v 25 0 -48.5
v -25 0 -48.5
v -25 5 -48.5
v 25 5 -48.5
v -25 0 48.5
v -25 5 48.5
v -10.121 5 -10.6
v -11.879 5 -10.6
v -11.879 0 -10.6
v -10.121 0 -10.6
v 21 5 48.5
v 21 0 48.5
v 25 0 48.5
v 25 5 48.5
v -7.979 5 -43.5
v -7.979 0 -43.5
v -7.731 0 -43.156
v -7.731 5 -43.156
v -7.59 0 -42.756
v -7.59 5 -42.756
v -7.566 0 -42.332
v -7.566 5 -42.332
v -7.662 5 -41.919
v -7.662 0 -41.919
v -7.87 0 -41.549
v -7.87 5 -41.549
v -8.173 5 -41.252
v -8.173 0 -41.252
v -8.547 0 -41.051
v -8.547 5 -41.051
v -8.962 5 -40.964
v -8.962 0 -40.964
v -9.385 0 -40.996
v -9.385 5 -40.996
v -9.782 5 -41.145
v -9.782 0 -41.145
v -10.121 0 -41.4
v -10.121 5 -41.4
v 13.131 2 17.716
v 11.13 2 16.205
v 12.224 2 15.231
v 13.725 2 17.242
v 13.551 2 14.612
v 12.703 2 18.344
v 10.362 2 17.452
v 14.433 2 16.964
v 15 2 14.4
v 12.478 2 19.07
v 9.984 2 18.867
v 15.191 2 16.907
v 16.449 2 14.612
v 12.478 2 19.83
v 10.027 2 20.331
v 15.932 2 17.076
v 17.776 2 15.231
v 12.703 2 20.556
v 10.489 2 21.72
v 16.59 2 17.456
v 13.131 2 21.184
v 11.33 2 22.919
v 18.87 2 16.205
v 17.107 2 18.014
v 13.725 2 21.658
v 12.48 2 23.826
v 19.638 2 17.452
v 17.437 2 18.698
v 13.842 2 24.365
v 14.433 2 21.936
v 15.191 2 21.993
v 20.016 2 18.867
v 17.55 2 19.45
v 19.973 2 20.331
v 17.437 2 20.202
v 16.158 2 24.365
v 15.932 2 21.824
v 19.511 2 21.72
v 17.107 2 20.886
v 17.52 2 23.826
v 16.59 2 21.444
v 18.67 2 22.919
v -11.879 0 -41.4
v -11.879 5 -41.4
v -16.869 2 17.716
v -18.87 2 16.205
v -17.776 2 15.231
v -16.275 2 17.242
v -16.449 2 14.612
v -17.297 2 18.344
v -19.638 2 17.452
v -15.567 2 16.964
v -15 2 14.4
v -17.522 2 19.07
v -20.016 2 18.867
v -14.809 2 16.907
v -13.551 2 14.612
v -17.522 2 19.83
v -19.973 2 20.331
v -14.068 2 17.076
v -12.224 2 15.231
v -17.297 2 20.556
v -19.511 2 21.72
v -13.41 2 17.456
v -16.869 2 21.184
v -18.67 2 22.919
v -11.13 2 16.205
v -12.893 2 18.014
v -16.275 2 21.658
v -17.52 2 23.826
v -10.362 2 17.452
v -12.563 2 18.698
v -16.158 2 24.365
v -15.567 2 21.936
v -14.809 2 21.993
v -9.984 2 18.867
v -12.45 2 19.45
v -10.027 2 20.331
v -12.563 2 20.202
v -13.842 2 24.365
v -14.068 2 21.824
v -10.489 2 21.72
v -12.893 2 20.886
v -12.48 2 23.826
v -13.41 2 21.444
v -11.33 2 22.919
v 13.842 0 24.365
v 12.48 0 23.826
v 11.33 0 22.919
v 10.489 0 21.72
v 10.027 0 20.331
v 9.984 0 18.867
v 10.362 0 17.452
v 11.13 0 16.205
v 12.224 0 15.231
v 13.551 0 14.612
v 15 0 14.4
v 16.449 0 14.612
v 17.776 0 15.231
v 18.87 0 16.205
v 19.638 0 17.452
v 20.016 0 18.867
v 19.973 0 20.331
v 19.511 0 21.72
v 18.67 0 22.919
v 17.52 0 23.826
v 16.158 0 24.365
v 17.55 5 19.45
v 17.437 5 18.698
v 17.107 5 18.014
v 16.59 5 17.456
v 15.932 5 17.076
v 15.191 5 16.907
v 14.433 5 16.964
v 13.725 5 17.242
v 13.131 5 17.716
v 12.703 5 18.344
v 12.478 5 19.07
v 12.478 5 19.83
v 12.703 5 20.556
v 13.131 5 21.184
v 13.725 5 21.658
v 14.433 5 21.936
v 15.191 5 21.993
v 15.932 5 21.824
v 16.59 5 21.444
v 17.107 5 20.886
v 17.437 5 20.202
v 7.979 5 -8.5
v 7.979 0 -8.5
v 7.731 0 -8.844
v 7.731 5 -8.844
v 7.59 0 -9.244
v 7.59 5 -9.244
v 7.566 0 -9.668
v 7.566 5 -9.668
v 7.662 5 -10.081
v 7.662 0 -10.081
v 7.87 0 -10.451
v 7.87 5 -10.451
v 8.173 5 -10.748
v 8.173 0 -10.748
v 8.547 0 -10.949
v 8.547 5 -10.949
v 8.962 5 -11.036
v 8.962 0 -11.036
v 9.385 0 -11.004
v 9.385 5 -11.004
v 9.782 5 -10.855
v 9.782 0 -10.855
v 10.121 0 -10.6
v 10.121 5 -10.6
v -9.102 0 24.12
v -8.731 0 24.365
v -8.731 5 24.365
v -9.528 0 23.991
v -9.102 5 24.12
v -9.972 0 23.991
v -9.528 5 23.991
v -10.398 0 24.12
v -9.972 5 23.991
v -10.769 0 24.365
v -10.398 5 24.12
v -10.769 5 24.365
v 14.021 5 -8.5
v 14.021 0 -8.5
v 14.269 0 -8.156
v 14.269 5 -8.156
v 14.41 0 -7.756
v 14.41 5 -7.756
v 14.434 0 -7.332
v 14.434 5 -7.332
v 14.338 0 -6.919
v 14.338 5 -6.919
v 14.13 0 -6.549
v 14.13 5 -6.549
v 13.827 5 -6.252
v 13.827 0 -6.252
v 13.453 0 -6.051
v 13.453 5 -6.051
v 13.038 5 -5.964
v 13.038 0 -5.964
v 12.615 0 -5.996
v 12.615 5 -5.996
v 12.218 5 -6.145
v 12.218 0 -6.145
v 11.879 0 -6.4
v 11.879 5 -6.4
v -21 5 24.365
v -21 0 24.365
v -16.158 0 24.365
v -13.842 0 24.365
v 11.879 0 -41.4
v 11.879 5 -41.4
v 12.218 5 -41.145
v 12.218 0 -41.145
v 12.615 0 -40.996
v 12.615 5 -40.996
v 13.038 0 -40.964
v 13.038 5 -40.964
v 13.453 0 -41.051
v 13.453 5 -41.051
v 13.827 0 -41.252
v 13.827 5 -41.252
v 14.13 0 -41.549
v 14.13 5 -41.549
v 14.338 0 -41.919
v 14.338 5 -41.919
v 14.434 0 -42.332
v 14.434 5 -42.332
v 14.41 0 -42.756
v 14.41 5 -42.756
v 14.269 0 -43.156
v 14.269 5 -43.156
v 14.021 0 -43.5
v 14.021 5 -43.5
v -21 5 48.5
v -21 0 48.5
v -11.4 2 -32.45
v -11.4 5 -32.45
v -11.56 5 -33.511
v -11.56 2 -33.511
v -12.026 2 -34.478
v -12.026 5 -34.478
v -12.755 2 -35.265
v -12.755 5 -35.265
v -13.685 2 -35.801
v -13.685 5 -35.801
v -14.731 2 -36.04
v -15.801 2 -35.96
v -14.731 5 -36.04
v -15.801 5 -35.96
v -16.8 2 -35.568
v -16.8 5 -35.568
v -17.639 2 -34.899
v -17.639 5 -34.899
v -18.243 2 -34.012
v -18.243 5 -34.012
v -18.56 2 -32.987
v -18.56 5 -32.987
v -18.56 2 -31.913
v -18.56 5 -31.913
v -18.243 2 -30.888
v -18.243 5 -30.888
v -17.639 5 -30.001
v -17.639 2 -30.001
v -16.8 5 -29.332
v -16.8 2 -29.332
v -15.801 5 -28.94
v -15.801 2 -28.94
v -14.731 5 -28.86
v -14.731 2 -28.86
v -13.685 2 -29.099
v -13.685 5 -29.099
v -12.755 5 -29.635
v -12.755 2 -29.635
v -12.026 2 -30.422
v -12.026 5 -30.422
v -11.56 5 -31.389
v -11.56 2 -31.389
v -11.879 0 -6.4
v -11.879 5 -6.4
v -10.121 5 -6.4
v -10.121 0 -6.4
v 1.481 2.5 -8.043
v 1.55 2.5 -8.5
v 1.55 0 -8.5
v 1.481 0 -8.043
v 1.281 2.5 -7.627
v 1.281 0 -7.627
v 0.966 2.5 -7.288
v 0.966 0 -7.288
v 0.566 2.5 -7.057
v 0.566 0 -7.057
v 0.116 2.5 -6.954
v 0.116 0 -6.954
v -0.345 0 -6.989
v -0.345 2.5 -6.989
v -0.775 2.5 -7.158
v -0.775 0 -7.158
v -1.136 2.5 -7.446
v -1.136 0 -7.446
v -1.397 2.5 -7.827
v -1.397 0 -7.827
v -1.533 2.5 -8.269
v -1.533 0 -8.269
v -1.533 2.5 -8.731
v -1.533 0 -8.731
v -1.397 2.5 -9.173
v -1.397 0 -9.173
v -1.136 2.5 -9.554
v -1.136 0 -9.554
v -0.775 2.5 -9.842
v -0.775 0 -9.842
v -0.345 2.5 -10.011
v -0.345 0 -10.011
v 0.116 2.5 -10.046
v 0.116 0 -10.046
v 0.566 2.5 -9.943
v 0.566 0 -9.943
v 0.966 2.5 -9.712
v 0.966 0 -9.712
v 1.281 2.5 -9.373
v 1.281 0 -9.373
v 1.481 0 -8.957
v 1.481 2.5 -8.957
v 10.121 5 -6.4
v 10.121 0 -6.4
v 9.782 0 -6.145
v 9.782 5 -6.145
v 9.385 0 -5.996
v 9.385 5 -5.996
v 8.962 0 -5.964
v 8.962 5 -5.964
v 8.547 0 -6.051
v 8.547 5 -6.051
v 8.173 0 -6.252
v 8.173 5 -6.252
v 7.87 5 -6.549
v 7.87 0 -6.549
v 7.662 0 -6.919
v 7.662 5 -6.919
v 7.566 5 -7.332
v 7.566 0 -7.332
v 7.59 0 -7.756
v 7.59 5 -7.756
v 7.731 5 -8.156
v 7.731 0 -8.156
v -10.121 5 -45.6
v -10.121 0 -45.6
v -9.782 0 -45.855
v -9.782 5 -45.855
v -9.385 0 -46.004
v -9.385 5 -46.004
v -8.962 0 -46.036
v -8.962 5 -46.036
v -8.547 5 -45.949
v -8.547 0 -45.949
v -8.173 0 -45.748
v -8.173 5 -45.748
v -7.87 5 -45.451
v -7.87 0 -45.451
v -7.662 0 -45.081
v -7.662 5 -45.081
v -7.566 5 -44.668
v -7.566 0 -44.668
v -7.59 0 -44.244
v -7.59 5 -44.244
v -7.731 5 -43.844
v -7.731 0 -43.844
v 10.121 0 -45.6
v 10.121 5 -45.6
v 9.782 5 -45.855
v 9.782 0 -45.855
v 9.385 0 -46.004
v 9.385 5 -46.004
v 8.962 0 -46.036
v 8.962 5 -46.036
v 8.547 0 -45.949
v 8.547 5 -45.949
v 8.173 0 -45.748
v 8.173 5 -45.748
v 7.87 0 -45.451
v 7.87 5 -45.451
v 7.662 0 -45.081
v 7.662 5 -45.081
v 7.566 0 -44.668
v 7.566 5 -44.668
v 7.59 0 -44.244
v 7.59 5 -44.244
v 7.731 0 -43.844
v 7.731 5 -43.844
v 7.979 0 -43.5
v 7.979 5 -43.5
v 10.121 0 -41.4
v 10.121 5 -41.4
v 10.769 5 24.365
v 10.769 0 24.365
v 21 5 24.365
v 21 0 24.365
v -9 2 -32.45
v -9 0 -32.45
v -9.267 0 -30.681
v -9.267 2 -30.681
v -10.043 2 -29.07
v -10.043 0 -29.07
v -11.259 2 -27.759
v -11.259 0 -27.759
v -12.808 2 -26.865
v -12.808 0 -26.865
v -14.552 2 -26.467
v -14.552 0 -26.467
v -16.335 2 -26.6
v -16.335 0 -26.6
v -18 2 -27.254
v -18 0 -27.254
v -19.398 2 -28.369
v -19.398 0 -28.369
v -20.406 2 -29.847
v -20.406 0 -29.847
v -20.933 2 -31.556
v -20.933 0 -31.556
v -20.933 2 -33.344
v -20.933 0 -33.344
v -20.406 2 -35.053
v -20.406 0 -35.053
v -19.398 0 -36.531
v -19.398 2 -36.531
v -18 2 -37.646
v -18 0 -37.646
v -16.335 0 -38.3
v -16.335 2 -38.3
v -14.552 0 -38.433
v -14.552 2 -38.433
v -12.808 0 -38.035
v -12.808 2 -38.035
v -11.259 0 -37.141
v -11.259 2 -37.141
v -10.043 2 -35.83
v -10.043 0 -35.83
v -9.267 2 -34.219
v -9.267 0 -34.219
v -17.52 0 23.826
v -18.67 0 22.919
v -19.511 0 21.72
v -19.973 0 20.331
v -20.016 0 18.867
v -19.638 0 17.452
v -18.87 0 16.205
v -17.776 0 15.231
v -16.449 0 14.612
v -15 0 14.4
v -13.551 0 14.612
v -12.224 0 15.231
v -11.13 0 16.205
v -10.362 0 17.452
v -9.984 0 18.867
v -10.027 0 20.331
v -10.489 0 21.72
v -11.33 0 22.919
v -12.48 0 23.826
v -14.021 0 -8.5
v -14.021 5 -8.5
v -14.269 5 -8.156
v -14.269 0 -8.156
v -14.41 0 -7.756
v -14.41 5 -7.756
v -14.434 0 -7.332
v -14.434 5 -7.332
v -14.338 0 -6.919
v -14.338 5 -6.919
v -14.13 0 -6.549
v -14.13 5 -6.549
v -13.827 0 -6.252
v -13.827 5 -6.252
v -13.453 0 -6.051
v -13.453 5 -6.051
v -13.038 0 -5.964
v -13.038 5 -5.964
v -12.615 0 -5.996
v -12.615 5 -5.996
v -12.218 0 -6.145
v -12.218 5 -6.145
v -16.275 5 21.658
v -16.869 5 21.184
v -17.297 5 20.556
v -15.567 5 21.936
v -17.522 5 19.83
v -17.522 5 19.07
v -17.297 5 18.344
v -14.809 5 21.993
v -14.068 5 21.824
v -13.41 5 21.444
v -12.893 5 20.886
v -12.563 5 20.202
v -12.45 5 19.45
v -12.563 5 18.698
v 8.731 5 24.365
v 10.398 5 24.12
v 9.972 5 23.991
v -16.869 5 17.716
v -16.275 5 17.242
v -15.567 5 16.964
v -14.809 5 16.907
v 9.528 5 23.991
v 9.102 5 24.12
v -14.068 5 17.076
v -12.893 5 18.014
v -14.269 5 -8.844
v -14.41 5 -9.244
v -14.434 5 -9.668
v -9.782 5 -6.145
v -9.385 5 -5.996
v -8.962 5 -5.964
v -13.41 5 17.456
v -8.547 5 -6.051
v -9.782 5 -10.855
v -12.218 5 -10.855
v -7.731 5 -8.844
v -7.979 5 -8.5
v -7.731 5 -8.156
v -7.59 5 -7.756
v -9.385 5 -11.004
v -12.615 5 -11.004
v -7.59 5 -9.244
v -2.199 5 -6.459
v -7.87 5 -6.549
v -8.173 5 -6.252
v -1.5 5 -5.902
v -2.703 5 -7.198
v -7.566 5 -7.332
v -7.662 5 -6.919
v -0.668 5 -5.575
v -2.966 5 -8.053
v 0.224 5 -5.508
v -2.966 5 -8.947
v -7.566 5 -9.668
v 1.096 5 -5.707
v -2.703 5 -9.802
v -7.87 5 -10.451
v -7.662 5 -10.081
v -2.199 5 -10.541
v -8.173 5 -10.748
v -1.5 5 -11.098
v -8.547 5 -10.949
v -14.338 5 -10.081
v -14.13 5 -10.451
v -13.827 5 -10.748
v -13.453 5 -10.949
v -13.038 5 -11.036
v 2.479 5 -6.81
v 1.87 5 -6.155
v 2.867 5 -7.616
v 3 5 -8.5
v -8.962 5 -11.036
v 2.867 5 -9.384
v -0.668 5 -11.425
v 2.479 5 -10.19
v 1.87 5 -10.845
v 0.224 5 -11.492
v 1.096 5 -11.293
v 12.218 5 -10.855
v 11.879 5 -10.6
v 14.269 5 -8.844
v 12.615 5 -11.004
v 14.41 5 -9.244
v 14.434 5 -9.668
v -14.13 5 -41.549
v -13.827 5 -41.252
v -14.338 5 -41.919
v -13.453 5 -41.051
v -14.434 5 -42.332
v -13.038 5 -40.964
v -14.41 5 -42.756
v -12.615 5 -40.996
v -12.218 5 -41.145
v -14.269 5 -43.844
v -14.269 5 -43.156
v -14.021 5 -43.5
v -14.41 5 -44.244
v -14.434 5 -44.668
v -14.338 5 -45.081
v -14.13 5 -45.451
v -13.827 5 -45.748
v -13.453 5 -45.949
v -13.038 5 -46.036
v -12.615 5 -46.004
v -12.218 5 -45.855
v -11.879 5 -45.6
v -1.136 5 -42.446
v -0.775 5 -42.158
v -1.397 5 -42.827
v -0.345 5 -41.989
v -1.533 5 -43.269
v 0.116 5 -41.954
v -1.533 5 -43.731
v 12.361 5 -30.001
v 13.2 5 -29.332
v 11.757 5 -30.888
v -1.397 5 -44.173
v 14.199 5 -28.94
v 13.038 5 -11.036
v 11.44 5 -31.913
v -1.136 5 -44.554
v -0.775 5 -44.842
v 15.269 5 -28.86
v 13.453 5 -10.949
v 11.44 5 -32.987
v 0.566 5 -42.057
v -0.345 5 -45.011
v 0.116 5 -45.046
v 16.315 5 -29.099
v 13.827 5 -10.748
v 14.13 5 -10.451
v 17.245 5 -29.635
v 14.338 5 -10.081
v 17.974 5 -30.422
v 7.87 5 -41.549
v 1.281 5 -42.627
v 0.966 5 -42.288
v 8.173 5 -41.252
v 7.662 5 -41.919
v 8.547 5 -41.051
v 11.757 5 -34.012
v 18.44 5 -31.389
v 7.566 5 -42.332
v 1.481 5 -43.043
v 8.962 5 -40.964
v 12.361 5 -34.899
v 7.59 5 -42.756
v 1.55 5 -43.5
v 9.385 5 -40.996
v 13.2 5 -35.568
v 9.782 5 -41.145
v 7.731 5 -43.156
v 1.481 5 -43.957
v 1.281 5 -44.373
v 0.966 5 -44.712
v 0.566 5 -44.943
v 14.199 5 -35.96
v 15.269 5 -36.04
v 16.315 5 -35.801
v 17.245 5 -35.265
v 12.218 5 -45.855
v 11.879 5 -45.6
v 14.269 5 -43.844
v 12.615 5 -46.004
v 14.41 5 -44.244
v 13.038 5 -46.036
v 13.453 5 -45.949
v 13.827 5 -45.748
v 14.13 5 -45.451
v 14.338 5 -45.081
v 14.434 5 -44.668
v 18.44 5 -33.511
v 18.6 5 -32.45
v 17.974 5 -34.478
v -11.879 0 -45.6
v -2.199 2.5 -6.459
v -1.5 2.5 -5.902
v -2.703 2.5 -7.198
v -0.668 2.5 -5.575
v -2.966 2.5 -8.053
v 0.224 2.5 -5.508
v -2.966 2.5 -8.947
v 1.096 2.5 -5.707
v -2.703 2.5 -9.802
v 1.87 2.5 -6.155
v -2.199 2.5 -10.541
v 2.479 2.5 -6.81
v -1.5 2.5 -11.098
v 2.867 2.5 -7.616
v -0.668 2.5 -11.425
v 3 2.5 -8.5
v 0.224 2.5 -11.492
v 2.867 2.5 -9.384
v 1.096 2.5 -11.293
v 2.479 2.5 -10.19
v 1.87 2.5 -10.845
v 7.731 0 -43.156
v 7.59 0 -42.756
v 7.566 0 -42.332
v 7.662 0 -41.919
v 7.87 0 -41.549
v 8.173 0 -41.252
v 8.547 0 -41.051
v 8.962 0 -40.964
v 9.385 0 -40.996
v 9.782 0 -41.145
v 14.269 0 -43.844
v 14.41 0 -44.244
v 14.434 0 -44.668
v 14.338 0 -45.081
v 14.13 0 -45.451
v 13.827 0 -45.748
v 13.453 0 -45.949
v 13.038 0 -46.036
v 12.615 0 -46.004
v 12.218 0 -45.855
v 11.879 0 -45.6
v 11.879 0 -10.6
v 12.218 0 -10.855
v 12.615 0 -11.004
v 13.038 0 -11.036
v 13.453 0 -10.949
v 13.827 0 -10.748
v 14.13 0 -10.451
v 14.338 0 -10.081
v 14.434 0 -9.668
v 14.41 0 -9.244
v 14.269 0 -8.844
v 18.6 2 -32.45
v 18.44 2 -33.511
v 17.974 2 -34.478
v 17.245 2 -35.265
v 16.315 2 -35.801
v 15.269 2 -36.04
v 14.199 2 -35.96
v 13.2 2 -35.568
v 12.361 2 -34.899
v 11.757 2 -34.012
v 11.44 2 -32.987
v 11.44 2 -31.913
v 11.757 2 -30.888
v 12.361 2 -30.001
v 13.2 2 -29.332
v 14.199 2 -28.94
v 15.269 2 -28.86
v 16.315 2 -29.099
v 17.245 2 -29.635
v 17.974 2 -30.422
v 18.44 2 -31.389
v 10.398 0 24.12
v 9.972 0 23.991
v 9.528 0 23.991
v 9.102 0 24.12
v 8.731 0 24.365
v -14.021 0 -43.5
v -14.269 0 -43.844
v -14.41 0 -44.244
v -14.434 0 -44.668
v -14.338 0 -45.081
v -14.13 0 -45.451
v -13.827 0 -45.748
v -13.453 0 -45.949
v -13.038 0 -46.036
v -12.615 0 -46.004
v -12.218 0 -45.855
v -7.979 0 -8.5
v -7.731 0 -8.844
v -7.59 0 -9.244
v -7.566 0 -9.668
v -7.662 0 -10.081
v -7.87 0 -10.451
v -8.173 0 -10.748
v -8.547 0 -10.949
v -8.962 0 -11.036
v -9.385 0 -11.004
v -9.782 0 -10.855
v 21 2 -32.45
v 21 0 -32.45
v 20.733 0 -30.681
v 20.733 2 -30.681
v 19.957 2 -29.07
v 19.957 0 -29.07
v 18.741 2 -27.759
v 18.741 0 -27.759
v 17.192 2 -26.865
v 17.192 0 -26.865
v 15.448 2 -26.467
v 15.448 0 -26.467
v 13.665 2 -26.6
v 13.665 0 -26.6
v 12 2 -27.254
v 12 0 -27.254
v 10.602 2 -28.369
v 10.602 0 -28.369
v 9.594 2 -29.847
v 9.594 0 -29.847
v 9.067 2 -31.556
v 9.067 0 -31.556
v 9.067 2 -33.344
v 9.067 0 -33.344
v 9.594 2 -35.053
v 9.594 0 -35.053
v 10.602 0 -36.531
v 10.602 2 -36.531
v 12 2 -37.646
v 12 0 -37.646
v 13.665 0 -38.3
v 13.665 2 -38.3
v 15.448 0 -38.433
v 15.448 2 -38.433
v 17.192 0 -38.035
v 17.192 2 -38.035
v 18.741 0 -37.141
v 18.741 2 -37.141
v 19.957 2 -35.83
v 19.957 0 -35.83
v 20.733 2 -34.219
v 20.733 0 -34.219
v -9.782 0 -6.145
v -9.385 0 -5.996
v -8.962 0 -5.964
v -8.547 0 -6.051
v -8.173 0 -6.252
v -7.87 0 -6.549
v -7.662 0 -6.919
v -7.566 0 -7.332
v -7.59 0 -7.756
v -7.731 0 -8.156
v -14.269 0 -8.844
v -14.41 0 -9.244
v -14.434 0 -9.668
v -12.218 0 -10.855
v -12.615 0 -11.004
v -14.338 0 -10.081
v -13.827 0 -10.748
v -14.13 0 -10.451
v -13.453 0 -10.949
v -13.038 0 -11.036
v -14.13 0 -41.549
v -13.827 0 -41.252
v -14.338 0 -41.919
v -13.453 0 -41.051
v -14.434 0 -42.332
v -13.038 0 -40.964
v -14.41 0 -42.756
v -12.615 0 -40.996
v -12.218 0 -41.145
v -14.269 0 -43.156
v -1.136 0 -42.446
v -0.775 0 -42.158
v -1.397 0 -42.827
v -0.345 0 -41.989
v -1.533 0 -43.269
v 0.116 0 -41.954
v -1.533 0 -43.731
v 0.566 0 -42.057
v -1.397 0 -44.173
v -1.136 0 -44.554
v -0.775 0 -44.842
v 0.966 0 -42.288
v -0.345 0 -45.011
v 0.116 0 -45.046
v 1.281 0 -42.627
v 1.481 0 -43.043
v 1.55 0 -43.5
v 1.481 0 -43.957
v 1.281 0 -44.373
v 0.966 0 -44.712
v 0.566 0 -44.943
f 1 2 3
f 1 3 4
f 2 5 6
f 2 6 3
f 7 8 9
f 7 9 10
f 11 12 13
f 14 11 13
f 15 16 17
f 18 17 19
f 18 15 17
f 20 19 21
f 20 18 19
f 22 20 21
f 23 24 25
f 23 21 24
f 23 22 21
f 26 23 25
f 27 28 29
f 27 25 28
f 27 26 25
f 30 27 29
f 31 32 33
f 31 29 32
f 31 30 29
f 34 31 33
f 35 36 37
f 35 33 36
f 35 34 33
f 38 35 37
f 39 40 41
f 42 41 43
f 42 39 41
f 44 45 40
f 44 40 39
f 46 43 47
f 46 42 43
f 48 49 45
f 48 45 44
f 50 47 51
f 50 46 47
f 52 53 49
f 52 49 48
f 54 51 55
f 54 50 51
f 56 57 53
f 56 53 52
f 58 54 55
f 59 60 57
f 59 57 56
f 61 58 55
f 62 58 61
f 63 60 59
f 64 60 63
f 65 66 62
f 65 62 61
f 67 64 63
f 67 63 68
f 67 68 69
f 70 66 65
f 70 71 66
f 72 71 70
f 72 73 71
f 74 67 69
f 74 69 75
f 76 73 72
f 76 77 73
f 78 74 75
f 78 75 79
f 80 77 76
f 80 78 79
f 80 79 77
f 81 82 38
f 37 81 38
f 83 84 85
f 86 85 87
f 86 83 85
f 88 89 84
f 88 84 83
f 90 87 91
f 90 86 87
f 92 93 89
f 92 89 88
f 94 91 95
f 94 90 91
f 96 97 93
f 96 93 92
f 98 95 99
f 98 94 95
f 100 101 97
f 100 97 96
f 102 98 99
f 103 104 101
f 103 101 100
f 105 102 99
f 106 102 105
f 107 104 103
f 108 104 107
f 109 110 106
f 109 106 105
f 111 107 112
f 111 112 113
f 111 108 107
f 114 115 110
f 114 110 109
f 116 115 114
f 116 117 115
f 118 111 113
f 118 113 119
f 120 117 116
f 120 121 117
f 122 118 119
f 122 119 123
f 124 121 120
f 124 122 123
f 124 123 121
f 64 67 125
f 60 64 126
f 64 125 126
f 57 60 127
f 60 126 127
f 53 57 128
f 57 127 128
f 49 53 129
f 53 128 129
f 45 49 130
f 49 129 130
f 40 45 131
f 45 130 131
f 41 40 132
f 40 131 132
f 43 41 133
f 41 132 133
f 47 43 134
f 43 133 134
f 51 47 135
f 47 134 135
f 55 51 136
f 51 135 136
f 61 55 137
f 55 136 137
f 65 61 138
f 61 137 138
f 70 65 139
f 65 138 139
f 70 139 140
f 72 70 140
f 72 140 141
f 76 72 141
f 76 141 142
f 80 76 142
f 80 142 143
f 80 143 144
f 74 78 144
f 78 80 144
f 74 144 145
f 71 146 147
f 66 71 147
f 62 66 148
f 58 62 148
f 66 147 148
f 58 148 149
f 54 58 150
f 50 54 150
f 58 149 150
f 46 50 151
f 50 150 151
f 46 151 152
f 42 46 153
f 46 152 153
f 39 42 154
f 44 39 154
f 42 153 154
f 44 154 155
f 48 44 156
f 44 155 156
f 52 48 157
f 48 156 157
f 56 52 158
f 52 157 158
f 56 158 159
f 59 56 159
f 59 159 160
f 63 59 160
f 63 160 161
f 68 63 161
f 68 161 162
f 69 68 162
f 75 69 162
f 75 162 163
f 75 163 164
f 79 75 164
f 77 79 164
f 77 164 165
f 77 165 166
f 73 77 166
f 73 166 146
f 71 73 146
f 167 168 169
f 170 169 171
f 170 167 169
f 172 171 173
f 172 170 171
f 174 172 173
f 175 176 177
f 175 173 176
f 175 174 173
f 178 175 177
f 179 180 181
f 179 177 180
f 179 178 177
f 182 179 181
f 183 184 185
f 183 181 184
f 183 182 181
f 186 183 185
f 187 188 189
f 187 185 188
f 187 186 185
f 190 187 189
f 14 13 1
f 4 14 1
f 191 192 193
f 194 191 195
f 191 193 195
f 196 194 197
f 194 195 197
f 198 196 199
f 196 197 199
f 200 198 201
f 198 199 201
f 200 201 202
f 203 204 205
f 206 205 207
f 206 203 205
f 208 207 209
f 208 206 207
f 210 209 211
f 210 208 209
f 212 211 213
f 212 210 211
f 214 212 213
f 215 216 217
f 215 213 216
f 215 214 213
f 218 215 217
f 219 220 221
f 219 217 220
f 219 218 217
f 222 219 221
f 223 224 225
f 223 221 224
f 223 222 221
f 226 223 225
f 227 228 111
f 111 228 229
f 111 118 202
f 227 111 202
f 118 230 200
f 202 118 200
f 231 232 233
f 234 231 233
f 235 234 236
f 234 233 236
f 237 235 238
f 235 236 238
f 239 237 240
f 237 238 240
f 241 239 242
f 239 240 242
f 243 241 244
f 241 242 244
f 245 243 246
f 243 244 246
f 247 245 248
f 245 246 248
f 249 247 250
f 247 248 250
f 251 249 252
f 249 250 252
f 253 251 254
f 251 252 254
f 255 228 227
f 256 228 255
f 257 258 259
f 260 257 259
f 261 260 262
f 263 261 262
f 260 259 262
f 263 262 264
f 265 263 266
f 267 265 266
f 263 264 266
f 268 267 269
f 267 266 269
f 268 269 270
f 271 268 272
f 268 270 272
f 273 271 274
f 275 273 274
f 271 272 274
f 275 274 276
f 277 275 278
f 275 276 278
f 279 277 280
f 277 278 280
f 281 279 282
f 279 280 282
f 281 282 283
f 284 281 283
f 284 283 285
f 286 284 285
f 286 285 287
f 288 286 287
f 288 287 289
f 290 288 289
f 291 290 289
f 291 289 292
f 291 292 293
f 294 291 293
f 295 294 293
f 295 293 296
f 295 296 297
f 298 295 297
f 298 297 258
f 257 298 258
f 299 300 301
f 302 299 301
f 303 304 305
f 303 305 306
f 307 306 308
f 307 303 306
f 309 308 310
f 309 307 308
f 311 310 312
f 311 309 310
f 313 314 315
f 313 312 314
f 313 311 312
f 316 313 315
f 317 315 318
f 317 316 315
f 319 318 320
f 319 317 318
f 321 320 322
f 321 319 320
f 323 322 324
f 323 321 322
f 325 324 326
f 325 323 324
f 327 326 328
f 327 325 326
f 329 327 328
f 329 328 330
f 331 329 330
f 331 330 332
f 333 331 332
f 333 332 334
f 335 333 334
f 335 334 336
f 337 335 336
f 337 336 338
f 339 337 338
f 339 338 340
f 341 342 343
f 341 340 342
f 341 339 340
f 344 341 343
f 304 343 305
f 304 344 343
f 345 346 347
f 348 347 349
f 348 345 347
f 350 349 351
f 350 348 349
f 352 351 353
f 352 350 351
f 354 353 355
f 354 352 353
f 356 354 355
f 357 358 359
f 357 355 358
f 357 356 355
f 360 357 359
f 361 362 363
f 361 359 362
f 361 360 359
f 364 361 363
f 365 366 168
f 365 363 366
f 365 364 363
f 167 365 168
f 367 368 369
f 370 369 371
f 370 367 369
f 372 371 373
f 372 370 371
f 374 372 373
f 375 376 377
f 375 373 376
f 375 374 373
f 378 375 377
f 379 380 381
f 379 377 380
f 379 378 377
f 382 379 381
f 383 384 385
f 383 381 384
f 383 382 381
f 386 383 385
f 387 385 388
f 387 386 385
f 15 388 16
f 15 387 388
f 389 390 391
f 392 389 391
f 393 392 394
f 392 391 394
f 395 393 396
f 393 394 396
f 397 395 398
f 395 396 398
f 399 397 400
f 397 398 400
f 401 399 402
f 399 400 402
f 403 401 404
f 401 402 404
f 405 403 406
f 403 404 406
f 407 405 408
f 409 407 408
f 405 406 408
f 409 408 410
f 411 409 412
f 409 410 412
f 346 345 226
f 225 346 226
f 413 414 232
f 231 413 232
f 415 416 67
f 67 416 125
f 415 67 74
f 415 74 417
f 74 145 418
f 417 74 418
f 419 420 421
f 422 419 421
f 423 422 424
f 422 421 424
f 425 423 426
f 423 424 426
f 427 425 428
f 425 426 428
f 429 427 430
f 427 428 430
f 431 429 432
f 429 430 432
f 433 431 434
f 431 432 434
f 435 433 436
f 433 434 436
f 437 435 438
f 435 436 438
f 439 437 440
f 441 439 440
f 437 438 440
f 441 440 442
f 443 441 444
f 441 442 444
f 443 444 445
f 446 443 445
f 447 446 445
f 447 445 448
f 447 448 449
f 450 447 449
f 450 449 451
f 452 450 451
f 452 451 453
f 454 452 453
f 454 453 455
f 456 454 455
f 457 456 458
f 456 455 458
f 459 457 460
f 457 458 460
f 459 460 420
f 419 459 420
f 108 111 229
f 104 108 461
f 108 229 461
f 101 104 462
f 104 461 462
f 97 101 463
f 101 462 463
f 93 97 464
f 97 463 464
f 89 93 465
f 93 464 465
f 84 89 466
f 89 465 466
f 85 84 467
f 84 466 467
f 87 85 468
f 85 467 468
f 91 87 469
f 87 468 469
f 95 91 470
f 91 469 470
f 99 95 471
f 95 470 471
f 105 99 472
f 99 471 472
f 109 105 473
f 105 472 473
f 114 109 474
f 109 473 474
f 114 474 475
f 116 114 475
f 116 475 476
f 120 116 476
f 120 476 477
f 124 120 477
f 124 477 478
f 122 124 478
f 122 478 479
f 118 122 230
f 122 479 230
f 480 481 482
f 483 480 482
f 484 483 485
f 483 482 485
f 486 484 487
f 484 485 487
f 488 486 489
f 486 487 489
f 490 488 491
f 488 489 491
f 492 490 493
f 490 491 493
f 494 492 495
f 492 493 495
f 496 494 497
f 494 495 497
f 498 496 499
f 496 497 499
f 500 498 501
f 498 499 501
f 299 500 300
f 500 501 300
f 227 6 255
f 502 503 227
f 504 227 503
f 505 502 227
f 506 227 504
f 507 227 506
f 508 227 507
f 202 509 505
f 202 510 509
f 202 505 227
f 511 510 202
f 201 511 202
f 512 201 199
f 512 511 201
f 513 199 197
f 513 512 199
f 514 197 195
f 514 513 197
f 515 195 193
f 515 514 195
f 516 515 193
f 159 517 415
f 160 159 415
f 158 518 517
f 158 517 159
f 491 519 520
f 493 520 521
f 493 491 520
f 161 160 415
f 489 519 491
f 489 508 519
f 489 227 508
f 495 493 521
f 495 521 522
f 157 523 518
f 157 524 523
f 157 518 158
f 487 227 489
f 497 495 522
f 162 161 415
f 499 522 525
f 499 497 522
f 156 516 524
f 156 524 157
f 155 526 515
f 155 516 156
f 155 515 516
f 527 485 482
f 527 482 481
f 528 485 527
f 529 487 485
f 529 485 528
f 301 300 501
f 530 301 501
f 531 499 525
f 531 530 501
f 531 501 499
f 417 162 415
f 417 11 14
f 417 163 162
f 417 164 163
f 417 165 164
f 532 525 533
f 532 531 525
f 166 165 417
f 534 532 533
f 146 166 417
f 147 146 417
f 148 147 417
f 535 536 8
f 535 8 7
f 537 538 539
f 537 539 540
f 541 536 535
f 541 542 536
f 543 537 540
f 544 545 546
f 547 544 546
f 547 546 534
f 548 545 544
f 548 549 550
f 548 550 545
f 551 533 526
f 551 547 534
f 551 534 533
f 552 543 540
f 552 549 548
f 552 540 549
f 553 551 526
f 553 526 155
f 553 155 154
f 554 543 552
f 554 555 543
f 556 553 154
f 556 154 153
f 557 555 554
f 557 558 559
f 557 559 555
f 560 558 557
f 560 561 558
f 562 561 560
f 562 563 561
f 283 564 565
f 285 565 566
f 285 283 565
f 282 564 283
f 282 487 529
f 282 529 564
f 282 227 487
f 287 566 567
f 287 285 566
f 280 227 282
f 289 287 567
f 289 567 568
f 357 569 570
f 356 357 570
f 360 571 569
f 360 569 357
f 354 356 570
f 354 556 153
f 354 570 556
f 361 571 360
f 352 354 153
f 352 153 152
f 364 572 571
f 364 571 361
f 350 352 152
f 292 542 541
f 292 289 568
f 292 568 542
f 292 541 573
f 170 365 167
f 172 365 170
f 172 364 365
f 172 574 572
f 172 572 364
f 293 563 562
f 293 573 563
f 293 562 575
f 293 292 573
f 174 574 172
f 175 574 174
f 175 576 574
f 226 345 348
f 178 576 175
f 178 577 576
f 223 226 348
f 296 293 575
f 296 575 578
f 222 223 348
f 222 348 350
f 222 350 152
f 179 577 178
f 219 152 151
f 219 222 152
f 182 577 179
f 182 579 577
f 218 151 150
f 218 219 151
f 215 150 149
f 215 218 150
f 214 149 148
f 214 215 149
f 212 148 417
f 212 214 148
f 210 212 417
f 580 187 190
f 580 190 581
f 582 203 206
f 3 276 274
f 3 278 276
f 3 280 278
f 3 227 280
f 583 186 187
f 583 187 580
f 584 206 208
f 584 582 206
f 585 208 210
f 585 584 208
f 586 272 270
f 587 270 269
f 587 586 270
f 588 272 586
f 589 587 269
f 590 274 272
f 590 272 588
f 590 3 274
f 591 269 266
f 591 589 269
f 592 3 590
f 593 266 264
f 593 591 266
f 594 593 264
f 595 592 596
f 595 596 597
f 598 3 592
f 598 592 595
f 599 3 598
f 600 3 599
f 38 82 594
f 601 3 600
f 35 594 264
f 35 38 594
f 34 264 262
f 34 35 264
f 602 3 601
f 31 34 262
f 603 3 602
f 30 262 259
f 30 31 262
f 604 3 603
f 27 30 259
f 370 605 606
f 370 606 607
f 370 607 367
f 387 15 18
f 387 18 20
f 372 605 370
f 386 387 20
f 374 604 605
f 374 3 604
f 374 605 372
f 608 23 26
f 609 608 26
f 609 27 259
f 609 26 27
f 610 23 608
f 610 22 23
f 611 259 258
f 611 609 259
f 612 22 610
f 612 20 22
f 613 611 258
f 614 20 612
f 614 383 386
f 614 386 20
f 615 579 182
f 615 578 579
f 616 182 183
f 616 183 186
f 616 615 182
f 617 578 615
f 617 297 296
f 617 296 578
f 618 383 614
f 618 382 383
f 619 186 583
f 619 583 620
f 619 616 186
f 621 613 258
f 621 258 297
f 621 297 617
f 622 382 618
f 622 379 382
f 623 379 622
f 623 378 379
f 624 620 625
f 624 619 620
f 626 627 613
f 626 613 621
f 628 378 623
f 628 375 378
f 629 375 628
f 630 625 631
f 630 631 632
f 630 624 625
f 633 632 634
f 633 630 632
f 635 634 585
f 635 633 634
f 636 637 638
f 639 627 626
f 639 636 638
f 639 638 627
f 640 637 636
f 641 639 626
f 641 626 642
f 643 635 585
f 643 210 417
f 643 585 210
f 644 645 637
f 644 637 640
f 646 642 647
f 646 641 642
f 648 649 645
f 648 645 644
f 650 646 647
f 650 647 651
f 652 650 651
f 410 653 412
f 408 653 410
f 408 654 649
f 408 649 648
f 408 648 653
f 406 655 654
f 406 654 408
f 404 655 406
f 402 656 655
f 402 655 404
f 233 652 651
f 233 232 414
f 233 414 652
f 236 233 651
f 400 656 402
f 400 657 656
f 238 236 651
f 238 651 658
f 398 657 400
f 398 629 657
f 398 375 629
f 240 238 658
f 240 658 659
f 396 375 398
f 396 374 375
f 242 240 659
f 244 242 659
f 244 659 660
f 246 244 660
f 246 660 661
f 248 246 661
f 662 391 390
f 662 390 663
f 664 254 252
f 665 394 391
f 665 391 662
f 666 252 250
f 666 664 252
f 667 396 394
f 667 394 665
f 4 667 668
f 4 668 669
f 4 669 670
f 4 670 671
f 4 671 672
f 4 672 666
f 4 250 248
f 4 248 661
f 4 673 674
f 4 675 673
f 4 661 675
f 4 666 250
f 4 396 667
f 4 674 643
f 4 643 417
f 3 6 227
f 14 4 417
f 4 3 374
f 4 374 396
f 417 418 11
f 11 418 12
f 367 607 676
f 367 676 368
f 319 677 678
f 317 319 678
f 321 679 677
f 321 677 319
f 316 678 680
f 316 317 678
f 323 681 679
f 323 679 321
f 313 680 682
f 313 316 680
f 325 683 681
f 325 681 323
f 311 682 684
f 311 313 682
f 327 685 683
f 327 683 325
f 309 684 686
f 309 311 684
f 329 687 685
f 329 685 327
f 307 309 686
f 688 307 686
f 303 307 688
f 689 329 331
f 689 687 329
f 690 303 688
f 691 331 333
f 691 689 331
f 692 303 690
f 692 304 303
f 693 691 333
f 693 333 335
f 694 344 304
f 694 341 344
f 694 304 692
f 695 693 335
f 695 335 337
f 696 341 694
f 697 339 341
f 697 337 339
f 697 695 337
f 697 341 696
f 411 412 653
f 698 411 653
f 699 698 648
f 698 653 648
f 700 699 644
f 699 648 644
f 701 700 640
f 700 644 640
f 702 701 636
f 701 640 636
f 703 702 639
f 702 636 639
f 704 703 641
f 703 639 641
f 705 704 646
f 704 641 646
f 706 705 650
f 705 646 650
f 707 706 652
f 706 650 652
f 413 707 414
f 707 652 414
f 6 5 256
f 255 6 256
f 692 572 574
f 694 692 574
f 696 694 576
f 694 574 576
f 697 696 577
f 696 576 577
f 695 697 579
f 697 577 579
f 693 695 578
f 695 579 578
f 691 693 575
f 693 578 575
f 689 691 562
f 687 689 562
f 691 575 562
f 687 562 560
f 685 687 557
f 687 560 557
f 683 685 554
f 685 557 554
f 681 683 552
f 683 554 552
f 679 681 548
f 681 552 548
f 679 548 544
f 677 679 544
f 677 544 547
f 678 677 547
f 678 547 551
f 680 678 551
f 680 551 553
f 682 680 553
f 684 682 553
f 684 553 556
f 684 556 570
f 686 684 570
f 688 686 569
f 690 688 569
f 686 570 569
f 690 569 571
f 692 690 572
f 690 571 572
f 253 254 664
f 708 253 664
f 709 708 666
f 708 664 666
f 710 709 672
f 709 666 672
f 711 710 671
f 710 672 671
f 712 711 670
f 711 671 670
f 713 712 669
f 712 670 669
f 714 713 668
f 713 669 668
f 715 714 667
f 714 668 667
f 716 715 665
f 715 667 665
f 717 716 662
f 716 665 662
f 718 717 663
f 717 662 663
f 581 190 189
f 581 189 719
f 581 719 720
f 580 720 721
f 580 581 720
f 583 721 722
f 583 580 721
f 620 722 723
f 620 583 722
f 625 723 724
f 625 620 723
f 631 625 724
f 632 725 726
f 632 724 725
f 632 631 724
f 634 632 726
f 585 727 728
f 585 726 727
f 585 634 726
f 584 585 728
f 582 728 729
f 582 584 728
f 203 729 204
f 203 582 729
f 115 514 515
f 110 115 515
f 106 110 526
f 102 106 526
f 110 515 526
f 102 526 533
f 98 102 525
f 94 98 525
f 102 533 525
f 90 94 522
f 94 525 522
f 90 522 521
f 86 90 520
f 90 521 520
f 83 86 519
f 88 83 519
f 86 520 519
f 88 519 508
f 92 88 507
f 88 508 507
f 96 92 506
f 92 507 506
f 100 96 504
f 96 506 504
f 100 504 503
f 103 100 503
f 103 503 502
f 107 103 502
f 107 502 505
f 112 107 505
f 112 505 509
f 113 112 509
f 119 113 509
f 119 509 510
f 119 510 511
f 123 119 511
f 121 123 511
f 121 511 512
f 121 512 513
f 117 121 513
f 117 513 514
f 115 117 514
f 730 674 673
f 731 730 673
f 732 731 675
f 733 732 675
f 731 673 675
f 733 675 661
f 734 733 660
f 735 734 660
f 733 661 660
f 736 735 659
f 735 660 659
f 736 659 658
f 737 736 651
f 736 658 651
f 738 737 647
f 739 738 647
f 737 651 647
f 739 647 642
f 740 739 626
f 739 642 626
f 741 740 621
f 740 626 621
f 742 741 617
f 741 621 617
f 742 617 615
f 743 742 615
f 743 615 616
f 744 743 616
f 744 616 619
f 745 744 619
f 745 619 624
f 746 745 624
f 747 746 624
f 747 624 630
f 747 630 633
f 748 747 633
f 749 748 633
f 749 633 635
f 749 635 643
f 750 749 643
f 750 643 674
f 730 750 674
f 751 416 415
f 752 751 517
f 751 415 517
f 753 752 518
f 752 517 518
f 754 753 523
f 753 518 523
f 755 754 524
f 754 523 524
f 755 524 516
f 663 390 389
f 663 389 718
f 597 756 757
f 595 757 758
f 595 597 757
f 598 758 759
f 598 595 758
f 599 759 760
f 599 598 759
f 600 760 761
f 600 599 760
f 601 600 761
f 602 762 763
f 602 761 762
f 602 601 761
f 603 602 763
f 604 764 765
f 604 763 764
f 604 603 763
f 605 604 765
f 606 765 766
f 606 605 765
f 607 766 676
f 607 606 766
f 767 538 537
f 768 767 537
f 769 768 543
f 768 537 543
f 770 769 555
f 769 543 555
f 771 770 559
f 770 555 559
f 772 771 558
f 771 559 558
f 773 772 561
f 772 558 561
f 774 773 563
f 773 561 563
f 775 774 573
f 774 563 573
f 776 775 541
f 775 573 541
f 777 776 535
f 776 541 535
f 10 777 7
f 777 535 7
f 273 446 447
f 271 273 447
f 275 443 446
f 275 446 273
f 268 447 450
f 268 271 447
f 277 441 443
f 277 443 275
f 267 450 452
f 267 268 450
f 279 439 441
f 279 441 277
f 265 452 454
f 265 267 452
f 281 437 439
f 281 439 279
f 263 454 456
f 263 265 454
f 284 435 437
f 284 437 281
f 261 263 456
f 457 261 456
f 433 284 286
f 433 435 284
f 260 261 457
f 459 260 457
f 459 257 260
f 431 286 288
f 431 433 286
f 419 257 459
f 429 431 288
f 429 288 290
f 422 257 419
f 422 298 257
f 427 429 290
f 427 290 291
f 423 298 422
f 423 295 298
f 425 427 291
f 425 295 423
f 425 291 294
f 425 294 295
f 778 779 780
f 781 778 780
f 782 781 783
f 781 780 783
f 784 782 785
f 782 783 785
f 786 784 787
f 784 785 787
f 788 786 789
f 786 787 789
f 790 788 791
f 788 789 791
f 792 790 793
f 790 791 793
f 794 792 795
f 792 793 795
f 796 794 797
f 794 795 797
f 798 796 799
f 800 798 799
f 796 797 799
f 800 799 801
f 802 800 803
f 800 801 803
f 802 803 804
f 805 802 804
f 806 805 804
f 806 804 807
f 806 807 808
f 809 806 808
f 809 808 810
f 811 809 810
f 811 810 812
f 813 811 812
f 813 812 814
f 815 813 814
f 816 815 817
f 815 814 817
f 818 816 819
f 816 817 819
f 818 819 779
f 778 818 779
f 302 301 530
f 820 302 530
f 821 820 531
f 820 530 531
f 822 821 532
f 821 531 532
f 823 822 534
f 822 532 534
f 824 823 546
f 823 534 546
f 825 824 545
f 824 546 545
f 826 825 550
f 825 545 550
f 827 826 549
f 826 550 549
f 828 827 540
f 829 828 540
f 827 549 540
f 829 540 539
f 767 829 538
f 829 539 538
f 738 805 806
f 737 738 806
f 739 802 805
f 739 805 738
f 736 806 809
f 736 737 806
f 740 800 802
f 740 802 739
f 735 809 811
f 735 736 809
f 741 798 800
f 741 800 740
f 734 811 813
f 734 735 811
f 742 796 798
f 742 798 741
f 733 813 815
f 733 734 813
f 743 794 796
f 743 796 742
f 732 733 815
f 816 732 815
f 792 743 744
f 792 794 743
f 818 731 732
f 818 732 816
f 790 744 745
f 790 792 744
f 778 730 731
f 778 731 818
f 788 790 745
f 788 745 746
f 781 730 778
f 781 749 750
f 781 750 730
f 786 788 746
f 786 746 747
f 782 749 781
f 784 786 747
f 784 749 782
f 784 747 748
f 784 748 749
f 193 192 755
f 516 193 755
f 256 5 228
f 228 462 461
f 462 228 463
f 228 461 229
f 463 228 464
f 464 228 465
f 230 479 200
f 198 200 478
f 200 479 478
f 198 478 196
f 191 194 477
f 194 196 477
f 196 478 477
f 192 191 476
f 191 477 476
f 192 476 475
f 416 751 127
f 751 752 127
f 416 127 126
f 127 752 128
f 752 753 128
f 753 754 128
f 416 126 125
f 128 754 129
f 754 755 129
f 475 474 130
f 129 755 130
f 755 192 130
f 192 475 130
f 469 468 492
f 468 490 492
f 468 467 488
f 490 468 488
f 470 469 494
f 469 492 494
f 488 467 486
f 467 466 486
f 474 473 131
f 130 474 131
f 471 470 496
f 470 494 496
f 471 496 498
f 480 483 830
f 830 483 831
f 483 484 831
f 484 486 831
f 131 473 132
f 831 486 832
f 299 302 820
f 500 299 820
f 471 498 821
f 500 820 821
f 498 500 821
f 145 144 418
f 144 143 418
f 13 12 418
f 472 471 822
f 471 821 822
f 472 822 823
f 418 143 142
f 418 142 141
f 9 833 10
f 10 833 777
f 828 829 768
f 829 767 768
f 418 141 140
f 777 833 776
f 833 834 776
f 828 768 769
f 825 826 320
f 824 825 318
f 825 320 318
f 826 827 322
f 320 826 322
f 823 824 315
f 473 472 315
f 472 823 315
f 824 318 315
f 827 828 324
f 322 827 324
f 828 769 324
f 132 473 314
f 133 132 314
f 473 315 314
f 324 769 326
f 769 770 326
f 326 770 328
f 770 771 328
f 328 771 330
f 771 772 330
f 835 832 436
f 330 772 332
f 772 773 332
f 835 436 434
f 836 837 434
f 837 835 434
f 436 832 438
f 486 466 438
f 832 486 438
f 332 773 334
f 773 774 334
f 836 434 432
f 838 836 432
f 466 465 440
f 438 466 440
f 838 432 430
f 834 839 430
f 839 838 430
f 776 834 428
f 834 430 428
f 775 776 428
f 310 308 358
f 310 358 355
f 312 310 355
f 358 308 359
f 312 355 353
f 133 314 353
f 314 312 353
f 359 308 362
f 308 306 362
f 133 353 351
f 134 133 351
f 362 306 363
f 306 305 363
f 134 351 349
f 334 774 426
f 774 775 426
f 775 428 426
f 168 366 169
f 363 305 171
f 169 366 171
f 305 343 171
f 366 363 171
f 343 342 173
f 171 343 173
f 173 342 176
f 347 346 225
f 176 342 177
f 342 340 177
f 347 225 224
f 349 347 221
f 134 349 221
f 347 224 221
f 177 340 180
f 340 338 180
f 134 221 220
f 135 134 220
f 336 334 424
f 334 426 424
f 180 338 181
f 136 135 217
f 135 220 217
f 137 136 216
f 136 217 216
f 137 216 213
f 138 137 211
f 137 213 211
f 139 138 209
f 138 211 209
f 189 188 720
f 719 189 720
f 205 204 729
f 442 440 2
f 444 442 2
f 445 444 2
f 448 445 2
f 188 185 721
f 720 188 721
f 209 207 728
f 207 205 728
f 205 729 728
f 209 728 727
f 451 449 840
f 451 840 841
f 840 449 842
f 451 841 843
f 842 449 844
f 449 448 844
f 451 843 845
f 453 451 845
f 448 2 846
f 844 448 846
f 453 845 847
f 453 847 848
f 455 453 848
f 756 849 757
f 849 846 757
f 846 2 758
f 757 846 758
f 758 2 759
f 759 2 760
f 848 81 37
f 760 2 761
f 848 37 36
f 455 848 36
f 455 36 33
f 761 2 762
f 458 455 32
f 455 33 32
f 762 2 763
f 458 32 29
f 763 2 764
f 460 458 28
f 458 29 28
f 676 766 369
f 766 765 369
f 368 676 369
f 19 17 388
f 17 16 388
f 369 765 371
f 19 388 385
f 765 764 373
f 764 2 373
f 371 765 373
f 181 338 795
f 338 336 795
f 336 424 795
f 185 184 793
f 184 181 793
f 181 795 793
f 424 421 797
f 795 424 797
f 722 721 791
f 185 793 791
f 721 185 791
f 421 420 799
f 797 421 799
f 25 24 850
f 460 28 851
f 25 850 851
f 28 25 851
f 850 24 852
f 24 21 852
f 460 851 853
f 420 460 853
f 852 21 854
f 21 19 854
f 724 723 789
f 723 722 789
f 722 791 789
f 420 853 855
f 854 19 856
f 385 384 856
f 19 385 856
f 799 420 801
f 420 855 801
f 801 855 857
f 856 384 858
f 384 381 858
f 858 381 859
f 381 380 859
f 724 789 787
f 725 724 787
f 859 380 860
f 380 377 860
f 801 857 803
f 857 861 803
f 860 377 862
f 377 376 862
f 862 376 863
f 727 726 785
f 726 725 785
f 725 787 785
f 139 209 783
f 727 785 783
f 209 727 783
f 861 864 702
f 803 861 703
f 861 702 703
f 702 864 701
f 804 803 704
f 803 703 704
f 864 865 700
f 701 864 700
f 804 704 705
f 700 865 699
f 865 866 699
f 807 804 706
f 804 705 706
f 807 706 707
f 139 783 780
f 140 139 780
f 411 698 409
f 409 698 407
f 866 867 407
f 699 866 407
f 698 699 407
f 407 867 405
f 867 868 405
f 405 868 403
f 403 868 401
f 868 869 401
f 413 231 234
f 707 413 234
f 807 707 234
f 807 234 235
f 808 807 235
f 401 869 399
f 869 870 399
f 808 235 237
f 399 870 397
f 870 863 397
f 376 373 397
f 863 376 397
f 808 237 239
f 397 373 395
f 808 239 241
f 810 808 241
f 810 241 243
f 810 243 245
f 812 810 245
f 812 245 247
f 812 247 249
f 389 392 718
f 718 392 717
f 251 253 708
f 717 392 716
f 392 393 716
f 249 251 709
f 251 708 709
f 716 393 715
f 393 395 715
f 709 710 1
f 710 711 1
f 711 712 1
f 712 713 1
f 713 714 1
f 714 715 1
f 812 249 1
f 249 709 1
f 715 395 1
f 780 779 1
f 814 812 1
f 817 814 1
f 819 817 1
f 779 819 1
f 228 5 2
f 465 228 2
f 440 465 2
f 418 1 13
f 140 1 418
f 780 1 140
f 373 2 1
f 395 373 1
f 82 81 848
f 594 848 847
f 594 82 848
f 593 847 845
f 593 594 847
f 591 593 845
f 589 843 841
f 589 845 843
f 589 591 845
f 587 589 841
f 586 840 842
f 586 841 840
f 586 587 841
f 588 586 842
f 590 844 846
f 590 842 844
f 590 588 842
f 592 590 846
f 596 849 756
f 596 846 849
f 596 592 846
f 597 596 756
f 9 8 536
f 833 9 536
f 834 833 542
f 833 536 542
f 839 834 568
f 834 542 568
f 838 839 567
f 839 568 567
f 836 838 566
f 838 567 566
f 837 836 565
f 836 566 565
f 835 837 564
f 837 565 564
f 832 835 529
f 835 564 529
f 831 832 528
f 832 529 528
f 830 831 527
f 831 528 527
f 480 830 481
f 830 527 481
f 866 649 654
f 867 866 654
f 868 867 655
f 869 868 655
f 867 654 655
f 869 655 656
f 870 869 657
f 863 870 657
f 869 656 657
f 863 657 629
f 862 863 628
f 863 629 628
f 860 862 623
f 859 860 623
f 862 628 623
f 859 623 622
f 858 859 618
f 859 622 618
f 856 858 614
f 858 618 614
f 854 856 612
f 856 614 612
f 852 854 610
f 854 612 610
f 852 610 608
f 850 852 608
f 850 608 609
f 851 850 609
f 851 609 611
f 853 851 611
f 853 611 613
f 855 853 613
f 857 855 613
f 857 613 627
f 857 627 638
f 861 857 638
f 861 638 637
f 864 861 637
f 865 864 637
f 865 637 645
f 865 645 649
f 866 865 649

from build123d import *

# Parameters (mm, degrees)
CROQUIS1_W              = 50
CROQUIS1_H              = 97
SALIENTE_EXTRUIR1_DEPTH = 5
CROQUIS2_R              = 3.6
CROQUIS2_R_2            = 2.55
CORTAR_EXTRUIR2_DEPTH   = 6
CROQUIS4_R              = 6
CROQUIS4_R_2            = 5.05
CORTAR_EXTRUIR3_DEPTH   = 2
CROQUIS5_R              = 1.55
CROQUIS5_W              = 6
CROQUIS5_H              = 4.2
CORTAR_EXTRUIR4_DEPTH   = 6
CORTAR_EXTRUIR6_DEPTH   = 6
CROQUIS14_R             = 3
CORTAR_EXTRUIR9_DEPTH   = 2.5
CROQUIS18_R             = 10.5
CROQUIS18_R_2           = 1.525
CORTAR_EXTRUIR10_DEPTH  = 6
CROQUIS20_W             = 42
CROQUIS20_H             = 25.956058456
CORTAR_EXTRUIR11_DEPTH  = 6


with BuildPart() as part:
    # Croquis1 → Saliente-Extruir1 (new body)
    with BuildSketch(Plane(origin=(0, 0, 0), x_dir=(1, 0, 0), z_dir=(0, 1, 0))):
        Rectangle(CROQUIS1_W, CROQUIS1_H)
    extrude(amount=SALIENTE_EXTRUIR1_DEPTH)

    # Croquis2 → Cortar-Extruir2 (cut, through all)
    with BuildSketch(Plane(origin=(0, 5, 0), x_dir=(1, 0, 0), z_dir=(0, 1, 0))):
        with Locations((-15, 32.45)):
            Circle(CROQUIS2_R)
        with Locations((15, 32.45)):
            Circle(CROQUIS2_R)
        with Locations((15, -19.45)):
            Circle(CROQUIS2_R_2)
        with Locations((-15, -19.45)):
            Circle(CROQUIS2_R_2)
    extrude(amount=-CORTAR_EXTRUIR2_DEPTH, mode=Mode.SUBTRACT)

    # Croquis4 → Cortar-Extruir3 (cut)
    with BuildSketch(Plane.XZ):
        with Locations((15, -32.45)):
            Circle(CROQUIS4_R)
        with Locations((-15, -32.45)):
            Circle(CROQUIS4_R)
        with Locations((-15, 19.45)):
            Circle(CROQUIS4_R_2)
        with Locations((15, 19.45)):
            Circle(CROQUIS4_R_2)
    extrude(amount=-CORTAR_EXTRUIR3_DEPTH, mode=Mode.SUBTRACT)

    # Croquis5 → Cortar-Extruir4 (cut, through all)
    with BuildSketch(Plane(origin=(0, 5, 0), x_dir=(1, 0, 0), z_dir=(0, 1, 0))):
        with Locations((0, 43.5)):
            Circle(CROQUIS5_R)
        with Locations((-11, 43.5)):
            Rectangle(CROQUIS5_W, CROQUIS5_H)
        with Locations((11, 43.5)):
            Rectangle(CROQUIS5_W, CROQUIS5_H)
    cortar_extruir4 = extrude(amount=-CORTAR_EXTRUIR4_DEPTH, mode=Mode.SUBTRACT)

    # Croquis8 → Cortar-Extruir6 (cut, through all)
    with BuildSketch(Plane(origin=(0, 5, 0), x_dir=(1, 0, 0), z_dir=(0, 1, 0))):
        with BuildLine():
            Line((-11.878679656, 45.6), (-10.121320344, 45.6))
            ThreePointArc((-10.121320344, 45.6), (-8.010608171, 45.610503119), (-7.979099854, 43.5))
            ThreePointArc((-7.979099854, 43.5), (-8.010608171, 41.389496881), (-10.121320344, 41.4))
            Line((-10.121320344, 41.4), (-11.878679656, 41.4))
            ThreePointArc((-11.878679656, 41.4), (-13.989391829, 41.389496881), (-14.020900146, 43.5))
            ThreePointArc((-14.020900146, 43.5), (-13.989391829, 45.610503119), (-11.878679656, 45.6))
        make_face()
        with BuildLine():
            Line((10.121320344, 41.4), (11.878679656, 41.4))
            ThreePointArc((11.878679656, 41.4), (13.989391829, 41.389496881), (14.020900146, 43.5))
            ThreePointArc((14.020900146, 43.5), (13.989391829, 45.610503119), (11.878679656, 45.6))
            Line((11.878679656, 45.6), (10.121320344, 45.6))
            ThreePointArc((10.121320344, 45.6), (8.010608171, 45.610503119), (7.979099854, 43.5))
            ThreePointArc((7.979099854, 43.5), (8.010608171, 41.389496881), (10.121320344, 41.4))
        make_face()
    cortar_extruir6 = extrude(amount=-CORTAR_EXTRUIR6_DEPTH, mode=Mode.SUBTRACT)

    # Simetría1: Cortar-Extruir4, Cortar-Extruir6 across plane
    add(cortar_extruir4.mirror(Plane.XY.offset(-26)), mode=Mode.SUBTRACT)
    add(cortar_extruir6.mirror(Plane.XY.offset(-26)), mode=Mode.SUBTRACT)

    # Croquis14 → Cortar-Extruir9 (cut)
    with BuildSketch(Plane(origin=(0, 5, 0), x_dir=(1, 0, 0), z_dir=(0, 1, 0))):
        with Locations((0, 8.5)):
            Circle(CROQUIS14_R)
    extrude(amount=-CORTAR_EXTRUIR9_DEPTH, mode=Mode.SUBTRACT)

    # Croquis18 → Cortar-Extruir10 (cut, through all)
    with BuildSketch(Plane(origin=(0, 5, 0), x_dir=(1, 0, 0), z_dir=(0, 1, 0))):
        with Locations((0, -35.5)):
            Circle(CROQUIS18_R)
        with Locations((9.75, -45.5)):
            Circle(CROQUIS18_R_2)
        with Locations((-9.75, -45.5)):
            Circle(CROQUIS18_R_2)
        with Locations((9.75, -25.5)):
            Circle(CROQUIS18_R_2)
        with Locations((-9.75, -25.5)):
            Circle(CROQUIS18_R_2)
    extrude(amount=-CORTAR_EXTRUIR10_DEPTH, mode=Mode.SUBTRACT)

    # Croquis20 → Cortar-Extruir11 (cut, through all)
    with BuildSketch(Plane.XZ):
        with Locations((0, 37.343359165)):
            Rectangle(CROQUIS20_W, CROQUIS20_H)
    extrude(amount=-CORTAR_EXTRUIR11_DEPTH, mode=Mode.SUBTRACT)


solid = part.part
